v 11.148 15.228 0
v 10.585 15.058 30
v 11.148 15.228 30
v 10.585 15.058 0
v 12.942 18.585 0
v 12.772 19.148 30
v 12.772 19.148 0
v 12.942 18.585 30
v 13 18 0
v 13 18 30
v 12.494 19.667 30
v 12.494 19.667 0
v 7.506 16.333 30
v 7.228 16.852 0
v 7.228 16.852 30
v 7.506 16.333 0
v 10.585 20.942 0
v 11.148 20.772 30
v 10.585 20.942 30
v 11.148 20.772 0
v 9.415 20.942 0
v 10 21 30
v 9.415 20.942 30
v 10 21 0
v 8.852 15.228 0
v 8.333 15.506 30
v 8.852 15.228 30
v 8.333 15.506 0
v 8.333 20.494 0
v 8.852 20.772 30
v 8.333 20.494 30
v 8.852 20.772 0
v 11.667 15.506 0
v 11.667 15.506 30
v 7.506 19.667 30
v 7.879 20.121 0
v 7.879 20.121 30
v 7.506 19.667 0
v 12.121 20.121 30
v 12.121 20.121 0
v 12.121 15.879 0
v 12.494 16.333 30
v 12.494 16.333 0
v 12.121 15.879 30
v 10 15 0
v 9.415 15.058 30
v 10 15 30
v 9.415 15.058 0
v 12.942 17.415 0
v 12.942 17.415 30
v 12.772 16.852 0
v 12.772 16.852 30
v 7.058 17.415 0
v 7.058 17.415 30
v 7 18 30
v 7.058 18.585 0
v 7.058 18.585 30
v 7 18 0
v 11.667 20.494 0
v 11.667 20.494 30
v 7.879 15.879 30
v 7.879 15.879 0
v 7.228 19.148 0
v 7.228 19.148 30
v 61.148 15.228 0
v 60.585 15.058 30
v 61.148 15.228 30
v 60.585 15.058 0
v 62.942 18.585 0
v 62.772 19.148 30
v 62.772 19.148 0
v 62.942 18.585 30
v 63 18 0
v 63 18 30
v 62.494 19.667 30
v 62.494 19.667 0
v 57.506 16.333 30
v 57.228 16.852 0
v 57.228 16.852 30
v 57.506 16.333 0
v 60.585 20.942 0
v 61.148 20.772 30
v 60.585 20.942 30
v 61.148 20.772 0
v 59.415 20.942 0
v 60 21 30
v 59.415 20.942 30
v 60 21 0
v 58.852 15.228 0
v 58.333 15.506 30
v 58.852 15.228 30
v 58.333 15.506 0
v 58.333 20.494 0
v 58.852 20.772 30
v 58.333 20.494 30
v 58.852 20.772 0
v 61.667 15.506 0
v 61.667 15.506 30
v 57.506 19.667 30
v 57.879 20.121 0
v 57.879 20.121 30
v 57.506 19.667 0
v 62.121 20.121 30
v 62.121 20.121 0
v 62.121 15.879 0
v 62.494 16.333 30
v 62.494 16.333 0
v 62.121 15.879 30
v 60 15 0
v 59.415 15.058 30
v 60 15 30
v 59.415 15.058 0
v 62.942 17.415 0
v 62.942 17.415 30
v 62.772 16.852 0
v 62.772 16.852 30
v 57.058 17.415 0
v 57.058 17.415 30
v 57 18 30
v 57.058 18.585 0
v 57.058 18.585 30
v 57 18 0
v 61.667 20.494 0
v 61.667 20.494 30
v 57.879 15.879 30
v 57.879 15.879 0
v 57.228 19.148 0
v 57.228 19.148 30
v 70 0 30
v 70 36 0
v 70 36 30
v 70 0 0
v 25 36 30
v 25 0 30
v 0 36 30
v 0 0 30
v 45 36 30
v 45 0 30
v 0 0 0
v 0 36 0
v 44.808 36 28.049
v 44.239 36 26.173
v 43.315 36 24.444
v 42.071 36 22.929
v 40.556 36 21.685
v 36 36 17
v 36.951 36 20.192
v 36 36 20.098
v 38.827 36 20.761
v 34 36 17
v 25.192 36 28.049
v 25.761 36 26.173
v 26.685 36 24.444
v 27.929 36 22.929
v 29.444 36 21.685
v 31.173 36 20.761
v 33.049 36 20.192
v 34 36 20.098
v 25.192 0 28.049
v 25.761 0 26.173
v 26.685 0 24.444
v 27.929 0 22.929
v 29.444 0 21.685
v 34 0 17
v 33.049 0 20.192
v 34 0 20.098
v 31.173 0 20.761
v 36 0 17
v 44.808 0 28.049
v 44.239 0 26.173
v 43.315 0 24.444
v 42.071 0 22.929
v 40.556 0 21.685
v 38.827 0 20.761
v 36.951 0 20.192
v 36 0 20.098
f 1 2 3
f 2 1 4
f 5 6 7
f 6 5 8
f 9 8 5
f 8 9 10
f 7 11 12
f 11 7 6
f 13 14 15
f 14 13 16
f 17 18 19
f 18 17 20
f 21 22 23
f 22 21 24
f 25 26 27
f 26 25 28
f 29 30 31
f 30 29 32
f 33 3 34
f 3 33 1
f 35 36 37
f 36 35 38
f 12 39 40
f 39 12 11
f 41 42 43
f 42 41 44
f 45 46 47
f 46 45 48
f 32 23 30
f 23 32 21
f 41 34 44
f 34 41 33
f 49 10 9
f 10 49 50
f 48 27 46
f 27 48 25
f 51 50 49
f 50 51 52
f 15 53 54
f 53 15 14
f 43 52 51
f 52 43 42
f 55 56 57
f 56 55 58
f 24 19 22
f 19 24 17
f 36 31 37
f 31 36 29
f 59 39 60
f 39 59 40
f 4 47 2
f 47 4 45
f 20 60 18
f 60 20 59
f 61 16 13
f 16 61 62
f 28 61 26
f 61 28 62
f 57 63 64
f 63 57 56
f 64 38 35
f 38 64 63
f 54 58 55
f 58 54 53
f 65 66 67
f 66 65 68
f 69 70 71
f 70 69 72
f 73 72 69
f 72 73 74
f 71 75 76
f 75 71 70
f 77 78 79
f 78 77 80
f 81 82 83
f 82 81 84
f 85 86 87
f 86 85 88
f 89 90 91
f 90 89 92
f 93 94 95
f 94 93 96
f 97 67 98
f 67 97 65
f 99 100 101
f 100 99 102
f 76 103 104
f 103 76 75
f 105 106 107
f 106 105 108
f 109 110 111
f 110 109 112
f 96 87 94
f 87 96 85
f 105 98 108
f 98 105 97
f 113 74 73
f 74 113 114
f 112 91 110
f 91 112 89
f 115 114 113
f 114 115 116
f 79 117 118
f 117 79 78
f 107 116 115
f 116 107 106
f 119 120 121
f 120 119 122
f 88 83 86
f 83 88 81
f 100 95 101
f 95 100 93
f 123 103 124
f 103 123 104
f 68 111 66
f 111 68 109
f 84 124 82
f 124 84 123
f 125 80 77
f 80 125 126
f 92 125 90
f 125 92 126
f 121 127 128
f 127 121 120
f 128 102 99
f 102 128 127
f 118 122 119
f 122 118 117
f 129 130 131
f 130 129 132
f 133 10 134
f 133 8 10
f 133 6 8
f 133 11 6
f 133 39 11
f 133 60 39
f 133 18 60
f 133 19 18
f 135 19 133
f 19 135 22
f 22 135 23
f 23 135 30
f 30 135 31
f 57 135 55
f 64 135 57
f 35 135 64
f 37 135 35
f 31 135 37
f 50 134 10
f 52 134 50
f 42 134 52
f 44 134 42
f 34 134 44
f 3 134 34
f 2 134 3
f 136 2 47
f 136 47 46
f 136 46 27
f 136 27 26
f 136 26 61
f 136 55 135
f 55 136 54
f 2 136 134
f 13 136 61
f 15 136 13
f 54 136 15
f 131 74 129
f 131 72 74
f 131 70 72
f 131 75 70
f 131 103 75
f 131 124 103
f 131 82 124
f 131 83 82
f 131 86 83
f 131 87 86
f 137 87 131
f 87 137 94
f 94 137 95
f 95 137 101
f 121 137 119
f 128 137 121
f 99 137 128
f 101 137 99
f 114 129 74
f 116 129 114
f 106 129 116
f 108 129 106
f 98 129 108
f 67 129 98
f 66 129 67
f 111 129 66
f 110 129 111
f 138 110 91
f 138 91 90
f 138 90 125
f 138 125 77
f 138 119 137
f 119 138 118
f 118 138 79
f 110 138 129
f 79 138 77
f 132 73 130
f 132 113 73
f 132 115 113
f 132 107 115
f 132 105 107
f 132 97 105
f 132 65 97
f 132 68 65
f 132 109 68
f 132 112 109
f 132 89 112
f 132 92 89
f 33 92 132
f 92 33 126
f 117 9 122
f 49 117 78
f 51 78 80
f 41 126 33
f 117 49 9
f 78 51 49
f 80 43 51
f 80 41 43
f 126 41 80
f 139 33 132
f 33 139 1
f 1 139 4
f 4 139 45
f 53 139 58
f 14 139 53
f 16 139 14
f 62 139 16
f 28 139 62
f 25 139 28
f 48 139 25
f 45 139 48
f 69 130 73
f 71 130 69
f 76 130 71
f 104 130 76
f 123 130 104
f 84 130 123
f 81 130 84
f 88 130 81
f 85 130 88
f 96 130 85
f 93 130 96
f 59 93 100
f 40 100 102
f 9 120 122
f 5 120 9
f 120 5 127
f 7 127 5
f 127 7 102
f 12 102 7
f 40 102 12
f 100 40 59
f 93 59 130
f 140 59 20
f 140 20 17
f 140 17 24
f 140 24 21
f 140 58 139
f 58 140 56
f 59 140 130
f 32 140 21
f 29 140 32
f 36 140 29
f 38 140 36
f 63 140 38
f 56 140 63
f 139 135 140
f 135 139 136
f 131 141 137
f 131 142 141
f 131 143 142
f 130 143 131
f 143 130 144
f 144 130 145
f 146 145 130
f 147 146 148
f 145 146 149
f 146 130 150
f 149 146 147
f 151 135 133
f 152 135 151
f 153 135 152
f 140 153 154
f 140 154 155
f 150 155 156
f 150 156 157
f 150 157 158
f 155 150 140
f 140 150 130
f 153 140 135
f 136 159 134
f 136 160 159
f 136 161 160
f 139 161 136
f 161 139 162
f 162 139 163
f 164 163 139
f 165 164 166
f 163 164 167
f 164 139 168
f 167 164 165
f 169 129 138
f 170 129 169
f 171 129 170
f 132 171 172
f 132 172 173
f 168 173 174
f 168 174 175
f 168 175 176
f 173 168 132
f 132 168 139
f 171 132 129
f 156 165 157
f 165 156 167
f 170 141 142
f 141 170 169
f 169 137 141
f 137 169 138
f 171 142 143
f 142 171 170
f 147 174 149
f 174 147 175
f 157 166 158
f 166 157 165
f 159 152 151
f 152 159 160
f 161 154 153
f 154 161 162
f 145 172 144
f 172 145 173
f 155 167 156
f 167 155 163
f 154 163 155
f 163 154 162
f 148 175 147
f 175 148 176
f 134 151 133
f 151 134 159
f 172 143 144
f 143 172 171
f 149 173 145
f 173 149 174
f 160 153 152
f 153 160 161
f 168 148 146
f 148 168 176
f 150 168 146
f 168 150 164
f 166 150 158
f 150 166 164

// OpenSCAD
$fn = 32;

// ----------------------------------------------------------------------
// Saddle clamp: split shaft clamp
// ----------------------------------------------------------------------

// --- parameters (mm) ---
blk_l = 70;               // block length, X
blk_w = 36;               // block width, Y
blk_h = 30;               // block height
clamp_r = 10;             // shaft groove radius
hole_r = 3;               // bolt hole radius
hole_m = 10;              // bolt hole margin from the ends
saw_w = 2;                // saw kerf width

saw_depth = clamp_r + 3;  // saw kerf depth

difference() {
  cube([blk_l, blk_w, blk_h]);
  translate([blk_l / 2, -1, blk_h])
    rotate([-90, 0, 0])
      cylinder(h = blk_w + 2, r = clamp_r);
  for (sx = [0, 1])
    translate([sx ? blk_l - hole_m : hole_m, blk_w / 2, -1])
      cylinder(r = hole_r, h = blk_h + 2);
  translate([blk_l / 2 - saw_w / 2, -1, blk_h - saw_depth])
    cube([saw_w, blk_w + 2, saw_depth + 1]);
}
